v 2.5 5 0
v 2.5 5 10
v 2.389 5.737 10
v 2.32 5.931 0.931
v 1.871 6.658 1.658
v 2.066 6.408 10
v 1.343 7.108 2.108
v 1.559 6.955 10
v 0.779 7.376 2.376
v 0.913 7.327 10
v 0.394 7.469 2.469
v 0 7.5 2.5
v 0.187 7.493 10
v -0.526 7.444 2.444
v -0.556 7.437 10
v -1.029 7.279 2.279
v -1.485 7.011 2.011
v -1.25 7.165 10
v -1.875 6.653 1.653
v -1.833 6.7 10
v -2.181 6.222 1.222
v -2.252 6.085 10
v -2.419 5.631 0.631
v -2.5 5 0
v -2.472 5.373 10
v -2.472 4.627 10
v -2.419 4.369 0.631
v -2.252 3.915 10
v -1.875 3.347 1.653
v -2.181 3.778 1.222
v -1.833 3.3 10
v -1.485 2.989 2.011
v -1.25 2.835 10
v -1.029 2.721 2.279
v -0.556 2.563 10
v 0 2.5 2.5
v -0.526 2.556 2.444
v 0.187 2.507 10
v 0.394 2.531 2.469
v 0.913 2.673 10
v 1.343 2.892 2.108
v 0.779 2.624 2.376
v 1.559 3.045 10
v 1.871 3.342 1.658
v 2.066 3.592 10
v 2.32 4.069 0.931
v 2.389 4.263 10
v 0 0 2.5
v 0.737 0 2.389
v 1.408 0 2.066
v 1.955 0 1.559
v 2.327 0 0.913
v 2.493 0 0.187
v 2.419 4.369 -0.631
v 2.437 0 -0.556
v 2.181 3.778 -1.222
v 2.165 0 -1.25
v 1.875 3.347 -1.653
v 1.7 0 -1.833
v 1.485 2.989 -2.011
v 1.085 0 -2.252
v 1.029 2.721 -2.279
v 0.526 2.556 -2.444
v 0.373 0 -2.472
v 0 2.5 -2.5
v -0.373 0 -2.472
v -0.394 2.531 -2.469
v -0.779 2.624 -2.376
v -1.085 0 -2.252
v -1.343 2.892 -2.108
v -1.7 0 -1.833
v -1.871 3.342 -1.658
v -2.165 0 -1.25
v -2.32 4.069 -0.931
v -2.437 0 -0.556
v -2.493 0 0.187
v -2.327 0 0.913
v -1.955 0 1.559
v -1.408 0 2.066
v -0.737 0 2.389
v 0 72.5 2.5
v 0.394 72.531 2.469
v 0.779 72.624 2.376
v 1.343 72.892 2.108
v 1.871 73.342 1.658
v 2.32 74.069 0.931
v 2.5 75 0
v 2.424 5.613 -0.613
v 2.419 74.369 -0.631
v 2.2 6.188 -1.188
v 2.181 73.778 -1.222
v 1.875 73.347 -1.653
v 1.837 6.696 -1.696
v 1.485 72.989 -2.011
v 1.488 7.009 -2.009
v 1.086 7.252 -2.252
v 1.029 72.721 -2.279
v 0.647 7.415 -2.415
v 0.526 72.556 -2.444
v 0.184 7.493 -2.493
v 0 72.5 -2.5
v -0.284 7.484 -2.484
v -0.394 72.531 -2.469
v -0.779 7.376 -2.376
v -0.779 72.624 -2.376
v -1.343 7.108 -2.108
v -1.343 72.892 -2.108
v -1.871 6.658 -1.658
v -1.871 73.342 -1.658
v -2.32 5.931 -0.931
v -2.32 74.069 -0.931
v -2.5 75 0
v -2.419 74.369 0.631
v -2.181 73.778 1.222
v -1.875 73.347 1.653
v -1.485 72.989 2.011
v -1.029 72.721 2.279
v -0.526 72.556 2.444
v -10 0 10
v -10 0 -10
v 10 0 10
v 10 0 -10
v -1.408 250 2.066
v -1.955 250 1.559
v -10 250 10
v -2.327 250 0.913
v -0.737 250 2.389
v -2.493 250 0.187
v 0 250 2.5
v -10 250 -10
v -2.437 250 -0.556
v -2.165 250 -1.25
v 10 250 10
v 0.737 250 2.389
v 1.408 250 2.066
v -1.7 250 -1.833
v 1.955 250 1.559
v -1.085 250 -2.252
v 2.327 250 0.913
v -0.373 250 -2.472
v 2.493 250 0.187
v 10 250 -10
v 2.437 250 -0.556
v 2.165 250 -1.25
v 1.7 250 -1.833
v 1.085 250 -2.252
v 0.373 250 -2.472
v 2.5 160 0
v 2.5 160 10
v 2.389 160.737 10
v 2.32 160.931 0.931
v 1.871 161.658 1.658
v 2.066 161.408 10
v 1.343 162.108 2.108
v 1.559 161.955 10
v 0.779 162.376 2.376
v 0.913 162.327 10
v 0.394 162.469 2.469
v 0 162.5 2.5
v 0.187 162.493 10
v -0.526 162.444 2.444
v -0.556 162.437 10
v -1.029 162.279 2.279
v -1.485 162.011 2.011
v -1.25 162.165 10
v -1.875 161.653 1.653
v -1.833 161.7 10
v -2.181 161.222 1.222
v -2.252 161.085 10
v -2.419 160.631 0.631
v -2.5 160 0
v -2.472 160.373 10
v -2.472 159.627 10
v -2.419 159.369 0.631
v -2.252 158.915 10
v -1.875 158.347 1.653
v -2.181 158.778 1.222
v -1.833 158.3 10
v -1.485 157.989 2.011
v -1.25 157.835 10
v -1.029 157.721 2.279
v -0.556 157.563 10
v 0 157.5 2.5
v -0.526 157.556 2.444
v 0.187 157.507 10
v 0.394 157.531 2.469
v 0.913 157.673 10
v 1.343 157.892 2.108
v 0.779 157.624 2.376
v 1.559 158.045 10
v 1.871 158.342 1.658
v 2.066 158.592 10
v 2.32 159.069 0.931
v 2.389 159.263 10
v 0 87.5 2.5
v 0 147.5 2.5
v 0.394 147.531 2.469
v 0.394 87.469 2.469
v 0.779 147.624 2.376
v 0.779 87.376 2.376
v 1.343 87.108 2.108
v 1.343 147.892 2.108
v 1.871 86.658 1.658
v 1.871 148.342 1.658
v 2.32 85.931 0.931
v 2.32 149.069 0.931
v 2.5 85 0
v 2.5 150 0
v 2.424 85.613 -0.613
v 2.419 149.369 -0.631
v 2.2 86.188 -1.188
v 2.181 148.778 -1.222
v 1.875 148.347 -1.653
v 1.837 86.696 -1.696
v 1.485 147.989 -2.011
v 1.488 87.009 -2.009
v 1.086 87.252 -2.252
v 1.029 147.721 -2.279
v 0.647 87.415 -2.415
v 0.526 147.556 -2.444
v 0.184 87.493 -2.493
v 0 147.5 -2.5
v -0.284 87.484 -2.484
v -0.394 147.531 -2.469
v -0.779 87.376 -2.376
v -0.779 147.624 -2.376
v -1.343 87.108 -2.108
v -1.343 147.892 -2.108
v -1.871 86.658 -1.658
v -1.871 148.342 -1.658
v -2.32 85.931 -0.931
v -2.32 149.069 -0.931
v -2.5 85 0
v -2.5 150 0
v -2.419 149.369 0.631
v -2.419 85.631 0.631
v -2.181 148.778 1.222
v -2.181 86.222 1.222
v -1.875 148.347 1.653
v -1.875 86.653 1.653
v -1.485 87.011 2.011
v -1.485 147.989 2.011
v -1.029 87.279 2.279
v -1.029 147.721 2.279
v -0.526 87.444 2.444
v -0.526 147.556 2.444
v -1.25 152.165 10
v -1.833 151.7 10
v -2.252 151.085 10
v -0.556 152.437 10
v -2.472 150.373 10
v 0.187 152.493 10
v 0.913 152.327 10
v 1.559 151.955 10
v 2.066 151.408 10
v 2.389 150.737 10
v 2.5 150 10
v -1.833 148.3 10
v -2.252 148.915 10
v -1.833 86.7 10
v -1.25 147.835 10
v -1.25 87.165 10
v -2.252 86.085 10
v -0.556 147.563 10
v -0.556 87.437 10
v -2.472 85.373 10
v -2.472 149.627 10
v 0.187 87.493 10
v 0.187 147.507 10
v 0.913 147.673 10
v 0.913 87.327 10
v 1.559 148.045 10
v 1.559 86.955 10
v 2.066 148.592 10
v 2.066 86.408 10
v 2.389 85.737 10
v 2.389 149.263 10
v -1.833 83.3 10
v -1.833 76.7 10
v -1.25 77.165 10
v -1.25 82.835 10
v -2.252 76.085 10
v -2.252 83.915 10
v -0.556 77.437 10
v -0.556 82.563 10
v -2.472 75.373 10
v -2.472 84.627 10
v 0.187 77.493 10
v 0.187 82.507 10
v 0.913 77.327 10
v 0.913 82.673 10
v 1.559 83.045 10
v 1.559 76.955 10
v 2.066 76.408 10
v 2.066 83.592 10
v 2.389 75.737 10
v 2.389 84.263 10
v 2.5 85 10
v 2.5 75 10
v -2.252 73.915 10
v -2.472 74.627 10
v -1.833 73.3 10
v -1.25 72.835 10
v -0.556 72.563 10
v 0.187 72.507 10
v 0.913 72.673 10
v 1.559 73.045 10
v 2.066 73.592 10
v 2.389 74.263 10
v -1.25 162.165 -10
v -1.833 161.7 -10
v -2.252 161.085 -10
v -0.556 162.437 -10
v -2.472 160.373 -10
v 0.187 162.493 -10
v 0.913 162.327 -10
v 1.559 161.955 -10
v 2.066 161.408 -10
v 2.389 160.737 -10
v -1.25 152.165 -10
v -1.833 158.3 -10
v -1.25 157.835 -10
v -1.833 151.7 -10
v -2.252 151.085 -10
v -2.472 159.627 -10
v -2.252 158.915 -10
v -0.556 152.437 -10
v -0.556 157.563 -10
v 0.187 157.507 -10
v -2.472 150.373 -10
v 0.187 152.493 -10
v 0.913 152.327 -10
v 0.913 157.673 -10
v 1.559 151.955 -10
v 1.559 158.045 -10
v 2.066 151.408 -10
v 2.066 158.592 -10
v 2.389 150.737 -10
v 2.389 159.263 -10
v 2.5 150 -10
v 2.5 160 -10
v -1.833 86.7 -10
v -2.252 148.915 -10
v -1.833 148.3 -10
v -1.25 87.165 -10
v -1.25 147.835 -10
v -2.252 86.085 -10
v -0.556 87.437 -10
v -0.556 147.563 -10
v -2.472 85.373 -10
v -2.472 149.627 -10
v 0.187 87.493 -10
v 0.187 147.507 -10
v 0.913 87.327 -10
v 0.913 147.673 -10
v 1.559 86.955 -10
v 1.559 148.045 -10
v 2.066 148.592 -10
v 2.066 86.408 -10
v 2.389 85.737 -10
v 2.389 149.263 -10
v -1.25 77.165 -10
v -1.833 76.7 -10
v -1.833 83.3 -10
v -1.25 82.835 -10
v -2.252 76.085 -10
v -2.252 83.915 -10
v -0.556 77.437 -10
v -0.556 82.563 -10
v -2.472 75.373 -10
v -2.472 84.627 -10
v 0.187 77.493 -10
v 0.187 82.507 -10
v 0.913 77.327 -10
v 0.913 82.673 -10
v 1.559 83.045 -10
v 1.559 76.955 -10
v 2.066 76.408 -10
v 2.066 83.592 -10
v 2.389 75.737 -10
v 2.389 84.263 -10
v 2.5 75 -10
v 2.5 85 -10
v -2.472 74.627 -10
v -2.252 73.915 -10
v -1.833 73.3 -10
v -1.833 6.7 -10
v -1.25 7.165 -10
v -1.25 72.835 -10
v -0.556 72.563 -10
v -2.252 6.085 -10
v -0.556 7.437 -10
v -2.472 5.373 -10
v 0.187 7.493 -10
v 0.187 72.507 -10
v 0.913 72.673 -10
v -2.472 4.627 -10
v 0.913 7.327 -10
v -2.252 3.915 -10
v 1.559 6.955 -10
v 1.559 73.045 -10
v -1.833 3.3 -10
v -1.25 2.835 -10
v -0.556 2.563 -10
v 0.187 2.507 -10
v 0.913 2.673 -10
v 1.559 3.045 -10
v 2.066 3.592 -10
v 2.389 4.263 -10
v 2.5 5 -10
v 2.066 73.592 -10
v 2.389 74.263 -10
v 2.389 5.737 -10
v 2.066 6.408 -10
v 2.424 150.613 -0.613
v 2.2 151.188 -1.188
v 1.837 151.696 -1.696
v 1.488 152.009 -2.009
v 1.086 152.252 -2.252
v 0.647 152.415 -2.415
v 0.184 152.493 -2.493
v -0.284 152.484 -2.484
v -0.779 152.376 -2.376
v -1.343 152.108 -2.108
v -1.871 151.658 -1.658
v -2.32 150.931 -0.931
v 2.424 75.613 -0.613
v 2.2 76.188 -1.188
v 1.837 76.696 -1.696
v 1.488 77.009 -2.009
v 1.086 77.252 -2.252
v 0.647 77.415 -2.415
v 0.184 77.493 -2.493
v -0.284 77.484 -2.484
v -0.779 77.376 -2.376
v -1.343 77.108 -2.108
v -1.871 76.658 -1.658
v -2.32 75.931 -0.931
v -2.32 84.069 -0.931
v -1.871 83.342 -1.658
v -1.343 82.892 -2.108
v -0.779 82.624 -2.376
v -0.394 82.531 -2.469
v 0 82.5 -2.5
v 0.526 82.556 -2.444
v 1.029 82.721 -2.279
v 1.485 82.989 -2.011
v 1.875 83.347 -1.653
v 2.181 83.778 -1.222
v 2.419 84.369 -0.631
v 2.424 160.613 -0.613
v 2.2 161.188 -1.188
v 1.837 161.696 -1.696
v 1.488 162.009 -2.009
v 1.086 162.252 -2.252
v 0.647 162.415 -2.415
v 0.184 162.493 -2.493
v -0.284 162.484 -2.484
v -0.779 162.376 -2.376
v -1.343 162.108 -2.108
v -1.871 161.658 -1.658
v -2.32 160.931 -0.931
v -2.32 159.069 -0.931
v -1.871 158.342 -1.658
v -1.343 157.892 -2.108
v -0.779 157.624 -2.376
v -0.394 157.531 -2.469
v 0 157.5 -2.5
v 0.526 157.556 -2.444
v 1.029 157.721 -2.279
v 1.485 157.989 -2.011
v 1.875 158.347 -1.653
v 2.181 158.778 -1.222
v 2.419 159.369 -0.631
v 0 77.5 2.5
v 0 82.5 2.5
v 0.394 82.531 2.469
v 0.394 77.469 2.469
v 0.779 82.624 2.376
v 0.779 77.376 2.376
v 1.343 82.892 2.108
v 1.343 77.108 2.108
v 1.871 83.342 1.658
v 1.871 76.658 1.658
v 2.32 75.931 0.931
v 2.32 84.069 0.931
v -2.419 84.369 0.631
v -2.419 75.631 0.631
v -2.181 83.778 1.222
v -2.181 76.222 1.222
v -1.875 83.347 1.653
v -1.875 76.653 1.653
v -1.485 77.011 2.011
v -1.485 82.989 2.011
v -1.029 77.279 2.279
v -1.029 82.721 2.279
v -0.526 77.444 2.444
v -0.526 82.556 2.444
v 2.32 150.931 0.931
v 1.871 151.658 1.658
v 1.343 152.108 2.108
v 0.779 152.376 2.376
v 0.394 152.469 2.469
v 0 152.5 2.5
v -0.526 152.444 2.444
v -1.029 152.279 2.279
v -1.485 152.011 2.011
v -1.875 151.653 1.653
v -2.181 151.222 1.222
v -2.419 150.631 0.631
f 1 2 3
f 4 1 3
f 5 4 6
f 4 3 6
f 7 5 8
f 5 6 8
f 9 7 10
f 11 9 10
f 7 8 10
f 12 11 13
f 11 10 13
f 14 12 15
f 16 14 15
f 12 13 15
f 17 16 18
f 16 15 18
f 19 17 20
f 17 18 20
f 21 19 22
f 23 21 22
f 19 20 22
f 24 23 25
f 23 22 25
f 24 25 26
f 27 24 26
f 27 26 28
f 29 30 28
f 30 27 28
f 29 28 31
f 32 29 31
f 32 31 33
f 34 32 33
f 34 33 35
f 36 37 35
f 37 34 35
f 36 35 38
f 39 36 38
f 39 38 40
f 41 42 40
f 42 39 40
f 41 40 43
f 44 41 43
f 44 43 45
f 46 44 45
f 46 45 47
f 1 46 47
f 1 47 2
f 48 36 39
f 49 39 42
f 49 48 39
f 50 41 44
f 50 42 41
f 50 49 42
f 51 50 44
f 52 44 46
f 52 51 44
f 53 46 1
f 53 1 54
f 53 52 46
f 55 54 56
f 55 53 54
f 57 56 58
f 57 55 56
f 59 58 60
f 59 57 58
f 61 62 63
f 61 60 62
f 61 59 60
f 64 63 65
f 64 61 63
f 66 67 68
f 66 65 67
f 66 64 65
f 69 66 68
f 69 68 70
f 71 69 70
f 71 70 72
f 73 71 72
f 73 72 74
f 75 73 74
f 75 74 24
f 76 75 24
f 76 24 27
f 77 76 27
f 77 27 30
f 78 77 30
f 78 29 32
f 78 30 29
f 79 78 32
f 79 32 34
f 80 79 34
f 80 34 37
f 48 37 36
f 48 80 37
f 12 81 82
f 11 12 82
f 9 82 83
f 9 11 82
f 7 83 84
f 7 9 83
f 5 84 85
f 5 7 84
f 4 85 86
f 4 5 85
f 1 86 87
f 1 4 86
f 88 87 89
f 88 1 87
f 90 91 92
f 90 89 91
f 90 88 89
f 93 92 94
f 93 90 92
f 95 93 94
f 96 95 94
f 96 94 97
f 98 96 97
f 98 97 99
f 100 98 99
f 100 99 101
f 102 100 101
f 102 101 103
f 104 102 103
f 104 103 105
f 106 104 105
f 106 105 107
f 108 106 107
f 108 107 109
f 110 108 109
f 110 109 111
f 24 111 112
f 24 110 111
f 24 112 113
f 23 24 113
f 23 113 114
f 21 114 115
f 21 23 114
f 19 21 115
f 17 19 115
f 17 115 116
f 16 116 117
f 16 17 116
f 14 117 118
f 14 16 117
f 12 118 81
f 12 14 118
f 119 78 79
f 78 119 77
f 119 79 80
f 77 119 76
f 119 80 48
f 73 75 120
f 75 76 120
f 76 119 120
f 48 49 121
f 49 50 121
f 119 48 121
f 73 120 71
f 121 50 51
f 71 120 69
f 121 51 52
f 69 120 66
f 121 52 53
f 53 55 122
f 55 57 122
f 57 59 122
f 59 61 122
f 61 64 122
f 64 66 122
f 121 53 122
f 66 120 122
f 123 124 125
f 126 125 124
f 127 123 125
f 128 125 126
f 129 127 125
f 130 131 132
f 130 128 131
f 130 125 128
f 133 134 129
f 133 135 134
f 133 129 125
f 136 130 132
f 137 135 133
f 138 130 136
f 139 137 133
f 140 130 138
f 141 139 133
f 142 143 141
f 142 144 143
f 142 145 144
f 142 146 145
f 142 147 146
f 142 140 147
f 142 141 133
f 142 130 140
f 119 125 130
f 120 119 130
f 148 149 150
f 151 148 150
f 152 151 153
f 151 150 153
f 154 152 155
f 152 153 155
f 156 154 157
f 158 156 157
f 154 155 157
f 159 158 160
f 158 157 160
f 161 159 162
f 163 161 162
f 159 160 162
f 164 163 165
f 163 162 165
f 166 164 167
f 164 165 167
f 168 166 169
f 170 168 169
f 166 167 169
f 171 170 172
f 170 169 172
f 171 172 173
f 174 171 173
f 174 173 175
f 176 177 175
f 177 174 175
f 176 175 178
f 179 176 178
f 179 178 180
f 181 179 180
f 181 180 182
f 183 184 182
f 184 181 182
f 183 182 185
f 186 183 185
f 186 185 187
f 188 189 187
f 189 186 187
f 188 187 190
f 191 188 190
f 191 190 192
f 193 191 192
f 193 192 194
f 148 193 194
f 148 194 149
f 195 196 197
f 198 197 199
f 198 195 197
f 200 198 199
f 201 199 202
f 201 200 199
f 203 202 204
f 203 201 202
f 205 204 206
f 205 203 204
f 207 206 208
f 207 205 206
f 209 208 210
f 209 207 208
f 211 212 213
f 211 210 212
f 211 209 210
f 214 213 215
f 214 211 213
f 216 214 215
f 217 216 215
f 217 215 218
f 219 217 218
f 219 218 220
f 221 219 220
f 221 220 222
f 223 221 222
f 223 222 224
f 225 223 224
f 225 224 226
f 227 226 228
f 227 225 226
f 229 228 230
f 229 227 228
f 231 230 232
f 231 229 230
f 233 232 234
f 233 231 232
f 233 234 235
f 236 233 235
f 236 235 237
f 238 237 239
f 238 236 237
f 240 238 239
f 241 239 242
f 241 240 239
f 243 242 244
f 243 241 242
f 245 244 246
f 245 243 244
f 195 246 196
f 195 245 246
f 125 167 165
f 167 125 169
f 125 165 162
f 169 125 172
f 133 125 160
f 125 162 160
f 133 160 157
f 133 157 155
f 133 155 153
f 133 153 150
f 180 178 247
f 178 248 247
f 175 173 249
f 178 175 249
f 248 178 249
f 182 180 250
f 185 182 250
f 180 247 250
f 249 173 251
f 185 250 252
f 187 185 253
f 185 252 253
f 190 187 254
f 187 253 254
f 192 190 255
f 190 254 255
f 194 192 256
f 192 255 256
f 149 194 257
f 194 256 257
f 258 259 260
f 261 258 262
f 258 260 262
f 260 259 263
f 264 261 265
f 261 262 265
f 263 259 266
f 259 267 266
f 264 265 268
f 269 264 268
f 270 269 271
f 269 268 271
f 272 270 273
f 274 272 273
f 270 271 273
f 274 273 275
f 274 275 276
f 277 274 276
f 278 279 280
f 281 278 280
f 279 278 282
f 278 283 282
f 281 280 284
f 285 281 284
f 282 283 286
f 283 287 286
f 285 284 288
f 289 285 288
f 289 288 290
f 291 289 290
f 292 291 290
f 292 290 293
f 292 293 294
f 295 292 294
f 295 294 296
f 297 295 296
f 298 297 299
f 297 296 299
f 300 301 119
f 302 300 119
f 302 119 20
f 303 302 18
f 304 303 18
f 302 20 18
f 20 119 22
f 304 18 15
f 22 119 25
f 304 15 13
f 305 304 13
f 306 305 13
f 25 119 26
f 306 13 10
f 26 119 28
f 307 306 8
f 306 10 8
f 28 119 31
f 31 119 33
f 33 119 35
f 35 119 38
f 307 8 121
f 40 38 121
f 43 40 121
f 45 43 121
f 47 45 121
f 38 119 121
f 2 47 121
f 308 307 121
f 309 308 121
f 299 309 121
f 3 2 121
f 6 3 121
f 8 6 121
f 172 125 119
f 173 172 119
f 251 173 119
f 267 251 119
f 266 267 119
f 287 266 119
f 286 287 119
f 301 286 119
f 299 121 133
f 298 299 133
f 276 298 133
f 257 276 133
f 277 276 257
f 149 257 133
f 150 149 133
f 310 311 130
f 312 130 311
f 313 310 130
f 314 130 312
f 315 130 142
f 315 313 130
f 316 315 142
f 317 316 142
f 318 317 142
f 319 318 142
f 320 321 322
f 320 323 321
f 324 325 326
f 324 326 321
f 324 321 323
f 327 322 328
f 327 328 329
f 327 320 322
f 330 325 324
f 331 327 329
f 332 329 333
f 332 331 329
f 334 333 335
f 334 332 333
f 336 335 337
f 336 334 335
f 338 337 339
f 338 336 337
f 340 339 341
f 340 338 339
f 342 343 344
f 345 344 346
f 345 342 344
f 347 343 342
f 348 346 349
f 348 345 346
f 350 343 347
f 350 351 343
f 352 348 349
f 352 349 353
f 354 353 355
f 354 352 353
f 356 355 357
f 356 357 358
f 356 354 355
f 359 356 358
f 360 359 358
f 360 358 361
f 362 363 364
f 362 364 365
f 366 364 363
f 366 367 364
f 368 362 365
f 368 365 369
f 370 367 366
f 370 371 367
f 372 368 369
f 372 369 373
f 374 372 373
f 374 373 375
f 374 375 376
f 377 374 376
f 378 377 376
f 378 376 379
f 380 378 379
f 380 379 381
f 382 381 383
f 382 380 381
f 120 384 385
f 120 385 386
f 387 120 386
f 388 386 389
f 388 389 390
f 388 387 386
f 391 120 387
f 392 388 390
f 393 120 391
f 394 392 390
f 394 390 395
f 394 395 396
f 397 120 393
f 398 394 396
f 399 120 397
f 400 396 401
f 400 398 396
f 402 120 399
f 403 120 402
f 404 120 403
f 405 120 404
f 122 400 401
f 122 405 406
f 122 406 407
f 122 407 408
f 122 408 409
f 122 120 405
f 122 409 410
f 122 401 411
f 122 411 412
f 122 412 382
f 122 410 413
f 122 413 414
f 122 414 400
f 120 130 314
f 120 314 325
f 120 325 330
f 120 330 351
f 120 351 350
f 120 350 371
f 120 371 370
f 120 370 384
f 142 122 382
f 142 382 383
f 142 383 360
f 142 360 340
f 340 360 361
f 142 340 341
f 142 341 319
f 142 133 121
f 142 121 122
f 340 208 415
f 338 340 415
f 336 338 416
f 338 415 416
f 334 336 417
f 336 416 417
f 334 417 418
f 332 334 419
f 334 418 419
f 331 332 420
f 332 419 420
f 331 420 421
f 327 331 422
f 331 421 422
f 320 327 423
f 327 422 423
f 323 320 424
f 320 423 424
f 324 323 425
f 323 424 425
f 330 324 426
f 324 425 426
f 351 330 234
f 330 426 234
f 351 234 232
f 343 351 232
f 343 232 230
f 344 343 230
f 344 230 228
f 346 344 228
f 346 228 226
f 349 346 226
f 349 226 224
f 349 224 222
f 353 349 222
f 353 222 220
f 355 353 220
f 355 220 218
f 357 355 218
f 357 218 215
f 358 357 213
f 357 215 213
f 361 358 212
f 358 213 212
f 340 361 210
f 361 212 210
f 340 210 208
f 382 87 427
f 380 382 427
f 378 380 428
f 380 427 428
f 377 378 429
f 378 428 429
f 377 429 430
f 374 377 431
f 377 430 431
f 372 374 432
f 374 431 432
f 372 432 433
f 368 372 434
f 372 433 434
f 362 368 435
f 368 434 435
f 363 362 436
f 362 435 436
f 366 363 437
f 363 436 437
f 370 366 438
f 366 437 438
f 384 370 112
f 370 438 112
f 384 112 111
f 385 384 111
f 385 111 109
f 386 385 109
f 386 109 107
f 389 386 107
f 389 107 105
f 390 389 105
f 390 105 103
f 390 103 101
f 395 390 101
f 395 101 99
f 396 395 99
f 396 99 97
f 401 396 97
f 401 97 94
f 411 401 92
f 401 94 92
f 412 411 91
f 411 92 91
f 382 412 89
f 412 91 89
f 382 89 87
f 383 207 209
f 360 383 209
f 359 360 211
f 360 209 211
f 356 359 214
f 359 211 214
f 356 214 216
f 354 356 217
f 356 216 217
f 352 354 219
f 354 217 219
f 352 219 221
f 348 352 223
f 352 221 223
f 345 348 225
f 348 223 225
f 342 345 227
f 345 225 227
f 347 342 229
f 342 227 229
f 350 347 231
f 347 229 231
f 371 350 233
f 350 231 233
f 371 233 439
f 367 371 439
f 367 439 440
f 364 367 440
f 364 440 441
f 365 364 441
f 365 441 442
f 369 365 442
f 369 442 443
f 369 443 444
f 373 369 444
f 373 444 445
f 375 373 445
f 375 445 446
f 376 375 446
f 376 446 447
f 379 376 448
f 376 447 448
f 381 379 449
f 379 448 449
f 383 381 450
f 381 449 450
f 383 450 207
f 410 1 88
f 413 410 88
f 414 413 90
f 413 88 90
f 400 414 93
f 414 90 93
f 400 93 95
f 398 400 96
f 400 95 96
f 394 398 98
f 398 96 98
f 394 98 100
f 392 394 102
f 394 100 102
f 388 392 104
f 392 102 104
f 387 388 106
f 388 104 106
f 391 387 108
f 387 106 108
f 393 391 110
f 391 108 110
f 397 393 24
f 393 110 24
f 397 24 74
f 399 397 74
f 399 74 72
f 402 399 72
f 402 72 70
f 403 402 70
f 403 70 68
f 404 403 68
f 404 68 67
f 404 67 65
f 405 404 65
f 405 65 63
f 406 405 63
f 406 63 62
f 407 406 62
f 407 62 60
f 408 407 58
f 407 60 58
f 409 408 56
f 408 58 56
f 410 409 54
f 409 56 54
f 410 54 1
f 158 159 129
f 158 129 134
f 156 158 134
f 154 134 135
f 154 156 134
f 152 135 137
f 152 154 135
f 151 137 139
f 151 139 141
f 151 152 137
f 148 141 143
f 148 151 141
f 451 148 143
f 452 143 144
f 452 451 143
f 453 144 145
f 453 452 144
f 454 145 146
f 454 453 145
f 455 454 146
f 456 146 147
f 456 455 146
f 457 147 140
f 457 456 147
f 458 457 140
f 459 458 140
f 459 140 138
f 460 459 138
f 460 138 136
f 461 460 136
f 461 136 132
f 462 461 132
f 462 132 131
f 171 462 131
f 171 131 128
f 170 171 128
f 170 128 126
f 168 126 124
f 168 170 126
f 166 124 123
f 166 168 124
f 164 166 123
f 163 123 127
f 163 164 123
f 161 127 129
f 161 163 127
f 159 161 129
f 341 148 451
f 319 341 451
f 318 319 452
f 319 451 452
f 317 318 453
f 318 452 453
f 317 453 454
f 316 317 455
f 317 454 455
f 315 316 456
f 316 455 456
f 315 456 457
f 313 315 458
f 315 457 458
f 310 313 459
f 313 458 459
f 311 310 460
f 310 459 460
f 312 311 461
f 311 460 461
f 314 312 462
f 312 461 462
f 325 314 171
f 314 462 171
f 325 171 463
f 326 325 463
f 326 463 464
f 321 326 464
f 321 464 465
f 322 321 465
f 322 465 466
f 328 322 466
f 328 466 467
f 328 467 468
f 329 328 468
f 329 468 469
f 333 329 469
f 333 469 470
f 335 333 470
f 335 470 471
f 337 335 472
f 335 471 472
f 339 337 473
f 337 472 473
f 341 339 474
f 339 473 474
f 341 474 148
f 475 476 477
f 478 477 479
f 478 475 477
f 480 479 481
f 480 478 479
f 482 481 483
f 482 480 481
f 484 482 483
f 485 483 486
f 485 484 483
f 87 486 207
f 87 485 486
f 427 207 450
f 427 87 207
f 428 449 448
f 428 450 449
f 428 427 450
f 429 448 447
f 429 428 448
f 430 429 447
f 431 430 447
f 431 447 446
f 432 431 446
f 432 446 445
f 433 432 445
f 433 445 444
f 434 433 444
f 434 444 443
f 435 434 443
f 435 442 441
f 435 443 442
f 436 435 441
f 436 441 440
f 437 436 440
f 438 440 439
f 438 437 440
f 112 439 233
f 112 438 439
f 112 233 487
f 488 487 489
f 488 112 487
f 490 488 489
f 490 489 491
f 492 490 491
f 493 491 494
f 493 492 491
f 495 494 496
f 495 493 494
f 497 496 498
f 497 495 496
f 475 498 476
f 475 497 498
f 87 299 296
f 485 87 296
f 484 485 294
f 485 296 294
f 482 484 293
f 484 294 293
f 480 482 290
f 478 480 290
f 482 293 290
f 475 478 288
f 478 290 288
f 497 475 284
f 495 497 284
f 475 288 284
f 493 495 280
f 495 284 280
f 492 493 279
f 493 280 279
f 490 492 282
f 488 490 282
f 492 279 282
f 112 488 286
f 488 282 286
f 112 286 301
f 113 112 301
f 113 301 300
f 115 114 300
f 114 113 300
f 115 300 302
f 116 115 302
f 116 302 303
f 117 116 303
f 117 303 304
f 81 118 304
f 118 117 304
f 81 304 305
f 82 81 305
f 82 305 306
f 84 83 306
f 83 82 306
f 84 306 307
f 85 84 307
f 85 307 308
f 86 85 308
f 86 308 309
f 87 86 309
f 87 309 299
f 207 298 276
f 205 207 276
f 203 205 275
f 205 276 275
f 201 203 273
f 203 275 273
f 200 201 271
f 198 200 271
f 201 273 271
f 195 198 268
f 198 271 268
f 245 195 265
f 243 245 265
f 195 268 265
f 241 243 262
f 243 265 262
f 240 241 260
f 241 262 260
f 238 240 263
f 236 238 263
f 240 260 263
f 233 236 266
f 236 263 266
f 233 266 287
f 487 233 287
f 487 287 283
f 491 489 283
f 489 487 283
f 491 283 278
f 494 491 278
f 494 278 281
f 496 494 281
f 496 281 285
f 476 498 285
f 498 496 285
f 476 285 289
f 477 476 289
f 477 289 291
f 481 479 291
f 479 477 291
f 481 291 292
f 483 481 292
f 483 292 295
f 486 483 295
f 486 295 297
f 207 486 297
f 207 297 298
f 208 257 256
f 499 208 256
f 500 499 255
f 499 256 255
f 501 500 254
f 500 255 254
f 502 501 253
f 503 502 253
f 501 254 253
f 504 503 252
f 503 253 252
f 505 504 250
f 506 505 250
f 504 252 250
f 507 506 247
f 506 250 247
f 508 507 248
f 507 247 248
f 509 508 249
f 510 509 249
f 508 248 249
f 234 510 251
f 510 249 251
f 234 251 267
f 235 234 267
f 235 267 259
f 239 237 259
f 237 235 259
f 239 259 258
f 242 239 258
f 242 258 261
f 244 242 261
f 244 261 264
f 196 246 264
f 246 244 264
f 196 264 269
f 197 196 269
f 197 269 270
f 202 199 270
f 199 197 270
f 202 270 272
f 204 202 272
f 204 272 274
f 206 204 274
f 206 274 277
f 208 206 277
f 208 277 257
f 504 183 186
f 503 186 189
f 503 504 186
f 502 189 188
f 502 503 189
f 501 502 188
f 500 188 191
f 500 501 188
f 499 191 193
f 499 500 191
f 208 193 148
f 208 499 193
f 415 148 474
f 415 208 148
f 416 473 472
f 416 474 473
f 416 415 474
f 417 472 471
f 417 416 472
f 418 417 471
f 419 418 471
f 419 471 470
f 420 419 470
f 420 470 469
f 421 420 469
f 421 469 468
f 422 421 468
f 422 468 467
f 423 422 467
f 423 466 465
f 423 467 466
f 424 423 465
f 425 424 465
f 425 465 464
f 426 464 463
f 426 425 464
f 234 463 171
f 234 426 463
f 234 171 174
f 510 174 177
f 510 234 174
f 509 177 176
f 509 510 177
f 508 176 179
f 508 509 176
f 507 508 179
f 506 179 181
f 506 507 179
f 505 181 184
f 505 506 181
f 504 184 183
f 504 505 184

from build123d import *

# Parameters (mm, degrees)
SKETCH2_W           = 20
SKETCH2_H           = 20
SKETCH2_R           = 2.5
BOSS_EXTRUDE1_DEPTH = 250
SKETCH3_R           = 2.5
CUT_EXTRUDE1_DEPTH  = 251.99800796
SKETCH4_R           = 2.5
CUT_EXTRUDE2_DEPTH  = 251.99800796


with BuildPart() as part:
    # Sketch2 → Boss-Extrude1 (new body)
    with BuildSketch(Plane(origin=(0, 0, 0), x_dir=(1, 0, 0), z_dir=(0, 1, 0))):
        Rectangle(SKETCH2_W, SKETCH2_H)
        with Locations(Location((0, 0, 0), (0, 0, 270))):
            Circle(SKETCH2_R, mode=Mode.SUBTRACT)
    extrude(amount=BOSS_EXTRUDE1_DEPTH)

    # Sketch3 → Cut-Extrude1 (cut, through all)
    with BuildSketch(Plane.XY.offset(10)):
        with Locations((0, 5)):
            Circle(SKETCH3_R)
    extrude(amount=-CUT_EXTRUDE1_DEPTH, mode=Mode.SUBTRACT)

    # Sketch4 → Cut-Extrude2 (cut, through all)
    with BuildSketch(Plane.XY.offset(10)):
        with Locations((0, 75)):
            Circle(SKETCH4_R)
        with Locations((0, 85)):
            Circle(SKETCH4_R)
        with Locations((0, 150)):
            Circle(SKETCH4_R)
        with Locations((0, 160)):
            Circle(SKETCH4_R)
    extrude(amount=-CUT_EXTRUDE2_DEPTH, mode=Mode.SUBTRACT)


solid = part.part
